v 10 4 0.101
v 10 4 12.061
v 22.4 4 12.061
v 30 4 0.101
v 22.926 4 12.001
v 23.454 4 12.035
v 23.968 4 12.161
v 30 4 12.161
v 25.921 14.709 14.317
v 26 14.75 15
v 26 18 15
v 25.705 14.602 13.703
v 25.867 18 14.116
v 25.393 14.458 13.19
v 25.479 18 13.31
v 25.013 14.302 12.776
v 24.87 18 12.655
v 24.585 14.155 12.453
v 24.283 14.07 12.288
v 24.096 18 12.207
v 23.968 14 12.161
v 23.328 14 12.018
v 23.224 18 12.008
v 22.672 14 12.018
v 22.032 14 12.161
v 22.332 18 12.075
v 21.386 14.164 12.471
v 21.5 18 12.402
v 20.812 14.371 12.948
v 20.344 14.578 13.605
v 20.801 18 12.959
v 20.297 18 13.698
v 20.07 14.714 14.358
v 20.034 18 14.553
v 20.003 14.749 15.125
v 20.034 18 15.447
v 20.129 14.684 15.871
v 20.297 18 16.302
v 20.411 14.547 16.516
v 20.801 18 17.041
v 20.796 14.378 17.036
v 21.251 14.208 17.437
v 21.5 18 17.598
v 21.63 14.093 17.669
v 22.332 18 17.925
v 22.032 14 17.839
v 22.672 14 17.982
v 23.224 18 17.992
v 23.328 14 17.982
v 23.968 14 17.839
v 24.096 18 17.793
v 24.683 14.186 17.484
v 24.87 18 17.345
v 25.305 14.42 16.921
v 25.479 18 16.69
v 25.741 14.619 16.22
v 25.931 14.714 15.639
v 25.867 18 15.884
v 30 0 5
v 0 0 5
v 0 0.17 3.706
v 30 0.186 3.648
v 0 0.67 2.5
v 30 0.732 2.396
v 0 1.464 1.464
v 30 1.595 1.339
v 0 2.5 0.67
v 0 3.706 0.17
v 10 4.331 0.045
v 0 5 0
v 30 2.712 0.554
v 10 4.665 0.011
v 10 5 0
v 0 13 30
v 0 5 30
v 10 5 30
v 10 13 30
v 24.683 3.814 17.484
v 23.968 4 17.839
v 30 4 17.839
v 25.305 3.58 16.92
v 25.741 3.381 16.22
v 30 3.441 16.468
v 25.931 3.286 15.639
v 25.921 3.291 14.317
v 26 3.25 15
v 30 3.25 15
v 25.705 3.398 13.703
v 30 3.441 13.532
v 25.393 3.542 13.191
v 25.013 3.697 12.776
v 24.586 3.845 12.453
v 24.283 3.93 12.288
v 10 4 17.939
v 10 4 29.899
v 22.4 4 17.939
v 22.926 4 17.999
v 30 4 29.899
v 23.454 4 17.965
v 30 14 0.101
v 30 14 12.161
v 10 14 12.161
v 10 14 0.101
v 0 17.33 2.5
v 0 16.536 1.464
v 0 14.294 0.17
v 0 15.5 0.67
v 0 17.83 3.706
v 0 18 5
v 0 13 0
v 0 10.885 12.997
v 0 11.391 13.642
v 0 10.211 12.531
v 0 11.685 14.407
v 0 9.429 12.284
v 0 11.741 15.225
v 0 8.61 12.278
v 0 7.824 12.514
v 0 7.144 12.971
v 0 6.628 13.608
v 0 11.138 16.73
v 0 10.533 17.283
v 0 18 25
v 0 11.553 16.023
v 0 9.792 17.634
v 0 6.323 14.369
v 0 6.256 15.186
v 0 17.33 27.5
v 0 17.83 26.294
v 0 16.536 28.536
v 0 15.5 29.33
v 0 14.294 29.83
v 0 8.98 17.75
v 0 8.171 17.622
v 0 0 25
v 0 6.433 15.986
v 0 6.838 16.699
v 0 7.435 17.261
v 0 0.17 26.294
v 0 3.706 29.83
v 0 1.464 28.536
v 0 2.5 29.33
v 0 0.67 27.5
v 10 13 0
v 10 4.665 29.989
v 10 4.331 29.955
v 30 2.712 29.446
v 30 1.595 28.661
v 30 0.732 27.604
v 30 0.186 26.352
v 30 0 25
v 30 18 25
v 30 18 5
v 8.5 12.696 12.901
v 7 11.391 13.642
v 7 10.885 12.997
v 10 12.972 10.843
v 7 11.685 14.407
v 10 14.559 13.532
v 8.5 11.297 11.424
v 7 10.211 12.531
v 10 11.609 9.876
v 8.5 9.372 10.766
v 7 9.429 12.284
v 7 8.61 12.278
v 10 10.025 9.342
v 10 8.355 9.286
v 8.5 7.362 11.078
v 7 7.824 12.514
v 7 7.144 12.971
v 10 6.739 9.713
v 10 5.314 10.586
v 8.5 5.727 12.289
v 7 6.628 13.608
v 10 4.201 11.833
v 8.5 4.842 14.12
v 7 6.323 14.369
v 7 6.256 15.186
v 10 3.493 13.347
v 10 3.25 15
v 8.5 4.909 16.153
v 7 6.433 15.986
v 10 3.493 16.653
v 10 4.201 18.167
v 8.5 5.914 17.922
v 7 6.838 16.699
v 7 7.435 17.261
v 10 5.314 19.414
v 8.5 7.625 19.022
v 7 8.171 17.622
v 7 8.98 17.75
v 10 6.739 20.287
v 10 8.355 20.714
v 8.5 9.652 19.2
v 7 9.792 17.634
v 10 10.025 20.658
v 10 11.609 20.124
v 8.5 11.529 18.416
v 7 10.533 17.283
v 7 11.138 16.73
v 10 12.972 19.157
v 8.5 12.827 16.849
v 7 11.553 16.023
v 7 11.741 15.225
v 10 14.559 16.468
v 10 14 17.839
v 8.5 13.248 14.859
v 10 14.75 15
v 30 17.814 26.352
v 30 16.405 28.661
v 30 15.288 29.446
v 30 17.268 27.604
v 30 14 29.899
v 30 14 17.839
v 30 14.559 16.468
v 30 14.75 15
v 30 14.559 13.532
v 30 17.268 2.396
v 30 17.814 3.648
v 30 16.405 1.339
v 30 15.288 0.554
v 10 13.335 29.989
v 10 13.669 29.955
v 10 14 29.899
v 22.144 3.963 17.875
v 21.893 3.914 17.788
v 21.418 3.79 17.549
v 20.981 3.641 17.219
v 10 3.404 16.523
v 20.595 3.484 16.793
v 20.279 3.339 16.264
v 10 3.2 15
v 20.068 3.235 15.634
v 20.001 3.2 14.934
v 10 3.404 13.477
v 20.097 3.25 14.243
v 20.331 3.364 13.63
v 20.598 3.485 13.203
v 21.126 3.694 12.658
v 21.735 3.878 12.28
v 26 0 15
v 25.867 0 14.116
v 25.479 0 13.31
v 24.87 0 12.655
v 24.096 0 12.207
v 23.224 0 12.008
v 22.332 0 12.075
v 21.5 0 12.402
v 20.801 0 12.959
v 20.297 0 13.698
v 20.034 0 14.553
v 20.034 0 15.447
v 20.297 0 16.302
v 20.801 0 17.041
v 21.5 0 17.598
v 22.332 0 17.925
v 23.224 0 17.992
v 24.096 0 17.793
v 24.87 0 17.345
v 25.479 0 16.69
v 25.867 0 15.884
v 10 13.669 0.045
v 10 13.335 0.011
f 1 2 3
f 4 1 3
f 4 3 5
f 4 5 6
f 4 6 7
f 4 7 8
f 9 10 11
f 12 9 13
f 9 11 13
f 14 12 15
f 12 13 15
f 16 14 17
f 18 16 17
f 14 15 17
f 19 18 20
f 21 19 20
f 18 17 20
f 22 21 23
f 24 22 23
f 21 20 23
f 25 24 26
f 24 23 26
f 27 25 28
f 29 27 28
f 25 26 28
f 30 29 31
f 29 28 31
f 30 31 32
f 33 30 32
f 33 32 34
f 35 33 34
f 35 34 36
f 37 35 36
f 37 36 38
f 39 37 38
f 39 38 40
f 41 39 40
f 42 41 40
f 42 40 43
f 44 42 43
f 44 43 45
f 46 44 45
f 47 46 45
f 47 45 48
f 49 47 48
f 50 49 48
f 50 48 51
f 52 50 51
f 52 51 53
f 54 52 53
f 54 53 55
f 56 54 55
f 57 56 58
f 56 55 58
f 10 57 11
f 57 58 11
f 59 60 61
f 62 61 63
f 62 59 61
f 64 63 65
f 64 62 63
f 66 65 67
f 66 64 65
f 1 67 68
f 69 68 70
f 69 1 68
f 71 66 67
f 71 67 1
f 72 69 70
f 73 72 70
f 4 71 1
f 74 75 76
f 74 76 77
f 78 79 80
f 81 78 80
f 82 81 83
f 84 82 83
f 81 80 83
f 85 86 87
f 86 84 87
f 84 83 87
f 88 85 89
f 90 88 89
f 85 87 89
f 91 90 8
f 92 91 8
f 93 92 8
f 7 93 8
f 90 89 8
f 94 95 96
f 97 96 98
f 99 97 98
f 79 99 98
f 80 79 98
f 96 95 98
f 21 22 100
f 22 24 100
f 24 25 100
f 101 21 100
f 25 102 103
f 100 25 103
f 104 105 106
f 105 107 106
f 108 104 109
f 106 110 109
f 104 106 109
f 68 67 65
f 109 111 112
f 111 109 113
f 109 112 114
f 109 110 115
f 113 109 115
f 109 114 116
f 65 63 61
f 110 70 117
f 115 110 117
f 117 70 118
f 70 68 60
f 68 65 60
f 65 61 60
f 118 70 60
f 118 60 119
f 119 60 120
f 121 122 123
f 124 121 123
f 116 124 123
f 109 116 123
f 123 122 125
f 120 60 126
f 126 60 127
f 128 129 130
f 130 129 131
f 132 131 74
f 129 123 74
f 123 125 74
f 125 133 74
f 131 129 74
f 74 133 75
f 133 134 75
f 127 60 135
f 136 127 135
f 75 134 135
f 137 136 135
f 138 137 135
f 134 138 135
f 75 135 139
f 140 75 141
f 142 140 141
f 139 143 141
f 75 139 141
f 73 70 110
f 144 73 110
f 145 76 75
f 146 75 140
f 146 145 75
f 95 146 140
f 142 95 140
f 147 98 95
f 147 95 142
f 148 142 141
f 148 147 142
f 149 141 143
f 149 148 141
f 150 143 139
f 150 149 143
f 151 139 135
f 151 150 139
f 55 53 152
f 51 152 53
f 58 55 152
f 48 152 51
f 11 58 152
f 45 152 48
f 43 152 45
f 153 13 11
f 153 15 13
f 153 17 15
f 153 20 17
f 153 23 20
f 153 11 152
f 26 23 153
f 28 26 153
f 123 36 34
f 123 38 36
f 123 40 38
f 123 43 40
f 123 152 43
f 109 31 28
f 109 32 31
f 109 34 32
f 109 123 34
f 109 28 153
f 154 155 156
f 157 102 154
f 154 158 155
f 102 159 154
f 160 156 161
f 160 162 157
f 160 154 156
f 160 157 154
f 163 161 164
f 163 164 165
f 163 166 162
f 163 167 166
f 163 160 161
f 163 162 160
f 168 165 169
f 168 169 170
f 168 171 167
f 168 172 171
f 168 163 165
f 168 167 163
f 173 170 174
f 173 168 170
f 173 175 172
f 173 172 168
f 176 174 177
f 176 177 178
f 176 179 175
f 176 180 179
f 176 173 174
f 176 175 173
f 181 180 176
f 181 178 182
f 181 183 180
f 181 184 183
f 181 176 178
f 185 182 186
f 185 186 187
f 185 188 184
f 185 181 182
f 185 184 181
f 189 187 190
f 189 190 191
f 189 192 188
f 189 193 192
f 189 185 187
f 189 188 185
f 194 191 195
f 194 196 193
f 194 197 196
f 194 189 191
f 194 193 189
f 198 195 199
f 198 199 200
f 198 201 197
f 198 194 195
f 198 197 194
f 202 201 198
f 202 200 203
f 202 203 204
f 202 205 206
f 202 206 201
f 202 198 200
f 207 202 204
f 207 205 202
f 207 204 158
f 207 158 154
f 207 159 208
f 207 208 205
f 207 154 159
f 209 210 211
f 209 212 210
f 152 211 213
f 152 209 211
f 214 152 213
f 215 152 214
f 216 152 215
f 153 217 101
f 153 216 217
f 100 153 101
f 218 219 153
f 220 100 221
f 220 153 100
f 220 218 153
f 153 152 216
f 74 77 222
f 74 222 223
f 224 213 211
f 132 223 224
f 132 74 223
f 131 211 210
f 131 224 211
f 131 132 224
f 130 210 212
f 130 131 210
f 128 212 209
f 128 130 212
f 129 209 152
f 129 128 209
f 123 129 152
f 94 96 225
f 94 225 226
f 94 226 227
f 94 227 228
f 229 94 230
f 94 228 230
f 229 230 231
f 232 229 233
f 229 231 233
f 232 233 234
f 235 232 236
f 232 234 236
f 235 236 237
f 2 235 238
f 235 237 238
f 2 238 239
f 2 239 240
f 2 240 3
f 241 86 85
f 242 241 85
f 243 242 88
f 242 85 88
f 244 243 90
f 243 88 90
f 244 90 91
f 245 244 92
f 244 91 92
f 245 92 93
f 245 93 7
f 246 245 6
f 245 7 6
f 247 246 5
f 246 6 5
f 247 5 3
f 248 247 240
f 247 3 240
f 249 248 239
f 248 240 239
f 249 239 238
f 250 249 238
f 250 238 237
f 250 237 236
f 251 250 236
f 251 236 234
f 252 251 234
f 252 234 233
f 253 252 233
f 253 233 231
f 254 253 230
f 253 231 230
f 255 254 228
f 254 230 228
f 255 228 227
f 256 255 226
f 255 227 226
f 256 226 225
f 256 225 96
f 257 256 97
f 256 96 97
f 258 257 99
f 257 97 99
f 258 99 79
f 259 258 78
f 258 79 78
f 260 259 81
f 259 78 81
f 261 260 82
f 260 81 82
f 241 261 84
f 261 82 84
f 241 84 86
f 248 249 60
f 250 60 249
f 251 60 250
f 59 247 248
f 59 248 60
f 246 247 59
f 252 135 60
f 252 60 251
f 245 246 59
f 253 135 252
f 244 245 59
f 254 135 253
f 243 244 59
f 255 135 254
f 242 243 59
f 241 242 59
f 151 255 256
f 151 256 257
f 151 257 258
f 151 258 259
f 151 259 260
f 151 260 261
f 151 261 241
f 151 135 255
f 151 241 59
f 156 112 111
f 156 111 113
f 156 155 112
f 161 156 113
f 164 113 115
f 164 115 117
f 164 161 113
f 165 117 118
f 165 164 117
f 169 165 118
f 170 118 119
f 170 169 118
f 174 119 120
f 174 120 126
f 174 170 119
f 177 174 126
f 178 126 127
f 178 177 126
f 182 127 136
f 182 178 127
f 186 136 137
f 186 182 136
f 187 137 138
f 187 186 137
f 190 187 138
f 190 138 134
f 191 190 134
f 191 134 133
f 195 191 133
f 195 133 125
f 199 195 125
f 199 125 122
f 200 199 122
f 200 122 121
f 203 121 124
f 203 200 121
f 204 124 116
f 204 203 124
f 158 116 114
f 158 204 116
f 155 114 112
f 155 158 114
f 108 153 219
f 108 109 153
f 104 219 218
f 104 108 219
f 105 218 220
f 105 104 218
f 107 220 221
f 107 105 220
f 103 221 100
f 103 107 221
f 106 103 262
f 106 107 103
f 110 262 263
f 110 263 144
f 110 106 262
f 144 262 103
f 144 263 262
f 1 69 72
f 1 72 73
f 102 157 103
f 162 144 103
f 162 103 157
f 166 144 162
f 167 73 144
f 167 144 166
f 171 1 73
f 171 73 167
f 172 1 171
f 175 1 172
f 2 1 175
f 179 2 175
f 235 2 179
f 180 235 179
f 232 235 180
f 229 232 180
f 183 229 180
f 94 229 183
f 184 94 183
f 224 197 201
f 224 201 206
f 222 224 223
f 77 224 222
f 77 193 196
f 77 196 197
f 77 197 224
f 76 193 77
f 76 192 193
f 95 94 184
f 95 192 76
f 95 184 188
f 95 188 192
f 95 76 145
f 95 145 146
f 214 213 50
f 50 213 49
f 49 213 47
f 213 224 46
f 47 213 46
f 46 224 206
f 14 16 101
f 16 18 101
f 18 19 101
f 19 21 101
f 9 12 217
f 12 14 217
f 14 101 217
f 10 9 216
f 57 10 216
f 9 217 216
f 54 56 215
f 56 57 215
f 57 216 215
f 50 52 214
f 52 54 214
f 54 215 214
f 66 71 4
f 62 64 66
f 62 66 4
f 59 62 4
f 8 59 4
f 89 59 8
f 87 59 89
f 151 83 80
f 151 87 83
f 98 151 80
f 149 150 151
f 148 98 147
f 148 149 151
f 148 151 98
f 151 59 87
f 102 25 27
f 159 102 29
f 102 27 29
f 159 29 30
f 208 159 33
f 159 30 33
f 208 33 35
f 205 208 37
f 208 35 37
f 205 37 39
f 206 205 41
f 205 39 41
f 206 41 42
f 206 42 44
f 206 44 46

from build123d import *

# Parameters (mm, degrees)
ESQUISSE1_W                        = 30
ESQUISSE1_H                        = 30
BOSS_EXTRU_1_DEPTH                 = 4
ENL_V_MAT_EXTRU_1_DEPTH            = 12.400000001
ESQUISSE3_W                        = 10
ESQUISSE3_H                        = 30
BOSS_EXTRU_2_DEPTH                 = 14
ESQUISSE4_W                        = 30
ESQUISSE4_H                        = 4
BOSS_EXTRU_3_DEPTH                 = 20
ESQUISSE5_R                        = 5.75
ENL_V_MAT_EXTRU_2_DEPTH            = 20
DIAM_TRE_DU_PER_AGE_6_0_6_1_REACH  = 20
DIAM_TRE_DU_PER_AGE_6_0_6_1_BORE_R = 3
DIAM_TRE_DU_PER_AGE_6_0_6_2_D      = 6
DIAM_TRE_DU_PER_AGE_6_0_6_2_DEPTH  = 18
CONG_2_R                           = 5


with BuildPart() as part:
    # Esquisse1 → Boss.-Extru.1 (new body)
    with BuildSketch(Plane.XZ):
        with Locations((15, 15)):
            Rectangle(ESQUISSE1_W, ESQUISSE1_H)
    extrude(amount=-BOSS_EXTRU_1_DEPTH)

    # Esquisse2 → Enlèv. mat.-Extru.1 (cut)
    with BuildSketch(Plane(origin=(22.400000001, 0, 0), x_dir=(0, 0, -1), z_dir=(1, 0, 0))):
        with BuildLine():
            Line((-12.060612309, 4), (-17.939387691, 4))
            ThreePointArc((-17.939387691, 4), (-15, 3.2), (-12.060612309, 4))
        make_face()
    extrude(amount=-ENL_V_MAT_EXTRU_1_DEPTH, mode=Mode.SUBTRACT)

    # Esquisse3 → Boss.-Extru.2 (add)
    with BuildSketch(Plane(origin=(0, 4, 0), x_dir=(-1, 0, 0), z_dir=(0, 1, 0))):
        with Locations((-5, 15)):
            Rectangle(ESQUISSE3_W, ESQUISSE3_H)
    extrude(amount=BOSS_EXTRU_2_DEPTH)

    # Esquisse4 → Boss.-Extru.3 (add)
    with BuildSketch(Plane(origin=(10, 0, 0), x_dir=(0, 0, -1), z_dir=(1, 0, 0))):
        with Locations((-15, 16)):
            Rectangle(ESQUISSE4_W, ESQUISSE4_H)
    extrude(amount=BOSS_EXTRU_3_DEPTH)

    # Esquisse5 → Enlèv. mat.-Extru.2 (cut)
    with BuildSketch(Plane(origin=(30, 0, 0), x_dir=(0, 0, -1), z_dir=(1, 0, 0))):
        with Locations((-15, 9)):
            Circle(ESQUISSE5_R)
    extrude(amount=-ENL_V_MAT_EXTRU_2_DEPTH, mode=Mode.SUBTRACT)

    # Esquisse7 → Enlèvement de matière-Révolution1 (revolve, cut)
    with BuildSketch(Plane(origin=(0, 0, 15), x_dir=(-1, 0, 0), z_dir=(0, 0, -1)), mode=Mode.PRIVATE) as enl_vement_de_mati_re_r_volution1_sk:
        Polygon((-10, 14.75), (-10, 9), (0, 9), (0, 11.75), (-7, 11.75), align=None)
    revolve(enl_vement_de_mati_re_r_volution1_sk.sketch.rotate(Axis((10, 9, 15), (-1, 0, 0)), 29.591845794), axis=Axis((10, 9, 15), (-1, 0, 0)), mode=Mode.SUBTRACT)  # turned: the seam where the file's is

    # Diamètre du perçage Ø6.0 (6)1 bore → Diamètre du perçage Ø6.0 (6)1 (cut, up to next)
    with BuildSketch(Plane(origin=(0, 18, 0), x_dir=(1, 0, 0), z_dir=(0, 1, 0)), mode=Mode.PRIVATE) as diam_tre_du_per_age_6_0_6_1_sk1:
        with Locations((23, -15)):
            Circle(DIAM_TRE_DU_PER_AGE_6_0_6_1_BORE_R)
    diam_tre_du_per_age_6_0_6_1_tool1 = extrude(diam_tre_du_per_age_6_0_6_1_sk1.sketch, amount=-DIAM_TRE_DU_PER_AGE_6_0_6_1_REACH, mode=Mode.PRIVATE) & part.part
    add(diam_tre_du_per_age_6_0_6_1_tool1.solids().sort_by_distance((23, 18, 15))[0], mode=Mode.SUBTRACT)

    # Diamètre du perçage Ø6.0 (6)2
    with Locations(Plane(origin=(0, 0, 0), x_dir=(-1, 0, 0), z_dir=(0, -1, 0))):
        with Locations((-23, -15)):
            Hole(DIAM_TRE_DU_PER_AGE_6_0_6_2_D / 2, depth=DIAM_TRE_DU_PER_AGE_6_0_6_2_DEPTH)

    # Congé2
    cong_2_edges = [part.edges().sort_by_distance(p)[0] for p in [
        (15, 18, 0),
        (15, 0, 0),
        (15, 0, 30),
        (15, 18, 30),
    ]]
    fillet(cong_2_edges, radius=CONG_2_R)


solid = part.part
